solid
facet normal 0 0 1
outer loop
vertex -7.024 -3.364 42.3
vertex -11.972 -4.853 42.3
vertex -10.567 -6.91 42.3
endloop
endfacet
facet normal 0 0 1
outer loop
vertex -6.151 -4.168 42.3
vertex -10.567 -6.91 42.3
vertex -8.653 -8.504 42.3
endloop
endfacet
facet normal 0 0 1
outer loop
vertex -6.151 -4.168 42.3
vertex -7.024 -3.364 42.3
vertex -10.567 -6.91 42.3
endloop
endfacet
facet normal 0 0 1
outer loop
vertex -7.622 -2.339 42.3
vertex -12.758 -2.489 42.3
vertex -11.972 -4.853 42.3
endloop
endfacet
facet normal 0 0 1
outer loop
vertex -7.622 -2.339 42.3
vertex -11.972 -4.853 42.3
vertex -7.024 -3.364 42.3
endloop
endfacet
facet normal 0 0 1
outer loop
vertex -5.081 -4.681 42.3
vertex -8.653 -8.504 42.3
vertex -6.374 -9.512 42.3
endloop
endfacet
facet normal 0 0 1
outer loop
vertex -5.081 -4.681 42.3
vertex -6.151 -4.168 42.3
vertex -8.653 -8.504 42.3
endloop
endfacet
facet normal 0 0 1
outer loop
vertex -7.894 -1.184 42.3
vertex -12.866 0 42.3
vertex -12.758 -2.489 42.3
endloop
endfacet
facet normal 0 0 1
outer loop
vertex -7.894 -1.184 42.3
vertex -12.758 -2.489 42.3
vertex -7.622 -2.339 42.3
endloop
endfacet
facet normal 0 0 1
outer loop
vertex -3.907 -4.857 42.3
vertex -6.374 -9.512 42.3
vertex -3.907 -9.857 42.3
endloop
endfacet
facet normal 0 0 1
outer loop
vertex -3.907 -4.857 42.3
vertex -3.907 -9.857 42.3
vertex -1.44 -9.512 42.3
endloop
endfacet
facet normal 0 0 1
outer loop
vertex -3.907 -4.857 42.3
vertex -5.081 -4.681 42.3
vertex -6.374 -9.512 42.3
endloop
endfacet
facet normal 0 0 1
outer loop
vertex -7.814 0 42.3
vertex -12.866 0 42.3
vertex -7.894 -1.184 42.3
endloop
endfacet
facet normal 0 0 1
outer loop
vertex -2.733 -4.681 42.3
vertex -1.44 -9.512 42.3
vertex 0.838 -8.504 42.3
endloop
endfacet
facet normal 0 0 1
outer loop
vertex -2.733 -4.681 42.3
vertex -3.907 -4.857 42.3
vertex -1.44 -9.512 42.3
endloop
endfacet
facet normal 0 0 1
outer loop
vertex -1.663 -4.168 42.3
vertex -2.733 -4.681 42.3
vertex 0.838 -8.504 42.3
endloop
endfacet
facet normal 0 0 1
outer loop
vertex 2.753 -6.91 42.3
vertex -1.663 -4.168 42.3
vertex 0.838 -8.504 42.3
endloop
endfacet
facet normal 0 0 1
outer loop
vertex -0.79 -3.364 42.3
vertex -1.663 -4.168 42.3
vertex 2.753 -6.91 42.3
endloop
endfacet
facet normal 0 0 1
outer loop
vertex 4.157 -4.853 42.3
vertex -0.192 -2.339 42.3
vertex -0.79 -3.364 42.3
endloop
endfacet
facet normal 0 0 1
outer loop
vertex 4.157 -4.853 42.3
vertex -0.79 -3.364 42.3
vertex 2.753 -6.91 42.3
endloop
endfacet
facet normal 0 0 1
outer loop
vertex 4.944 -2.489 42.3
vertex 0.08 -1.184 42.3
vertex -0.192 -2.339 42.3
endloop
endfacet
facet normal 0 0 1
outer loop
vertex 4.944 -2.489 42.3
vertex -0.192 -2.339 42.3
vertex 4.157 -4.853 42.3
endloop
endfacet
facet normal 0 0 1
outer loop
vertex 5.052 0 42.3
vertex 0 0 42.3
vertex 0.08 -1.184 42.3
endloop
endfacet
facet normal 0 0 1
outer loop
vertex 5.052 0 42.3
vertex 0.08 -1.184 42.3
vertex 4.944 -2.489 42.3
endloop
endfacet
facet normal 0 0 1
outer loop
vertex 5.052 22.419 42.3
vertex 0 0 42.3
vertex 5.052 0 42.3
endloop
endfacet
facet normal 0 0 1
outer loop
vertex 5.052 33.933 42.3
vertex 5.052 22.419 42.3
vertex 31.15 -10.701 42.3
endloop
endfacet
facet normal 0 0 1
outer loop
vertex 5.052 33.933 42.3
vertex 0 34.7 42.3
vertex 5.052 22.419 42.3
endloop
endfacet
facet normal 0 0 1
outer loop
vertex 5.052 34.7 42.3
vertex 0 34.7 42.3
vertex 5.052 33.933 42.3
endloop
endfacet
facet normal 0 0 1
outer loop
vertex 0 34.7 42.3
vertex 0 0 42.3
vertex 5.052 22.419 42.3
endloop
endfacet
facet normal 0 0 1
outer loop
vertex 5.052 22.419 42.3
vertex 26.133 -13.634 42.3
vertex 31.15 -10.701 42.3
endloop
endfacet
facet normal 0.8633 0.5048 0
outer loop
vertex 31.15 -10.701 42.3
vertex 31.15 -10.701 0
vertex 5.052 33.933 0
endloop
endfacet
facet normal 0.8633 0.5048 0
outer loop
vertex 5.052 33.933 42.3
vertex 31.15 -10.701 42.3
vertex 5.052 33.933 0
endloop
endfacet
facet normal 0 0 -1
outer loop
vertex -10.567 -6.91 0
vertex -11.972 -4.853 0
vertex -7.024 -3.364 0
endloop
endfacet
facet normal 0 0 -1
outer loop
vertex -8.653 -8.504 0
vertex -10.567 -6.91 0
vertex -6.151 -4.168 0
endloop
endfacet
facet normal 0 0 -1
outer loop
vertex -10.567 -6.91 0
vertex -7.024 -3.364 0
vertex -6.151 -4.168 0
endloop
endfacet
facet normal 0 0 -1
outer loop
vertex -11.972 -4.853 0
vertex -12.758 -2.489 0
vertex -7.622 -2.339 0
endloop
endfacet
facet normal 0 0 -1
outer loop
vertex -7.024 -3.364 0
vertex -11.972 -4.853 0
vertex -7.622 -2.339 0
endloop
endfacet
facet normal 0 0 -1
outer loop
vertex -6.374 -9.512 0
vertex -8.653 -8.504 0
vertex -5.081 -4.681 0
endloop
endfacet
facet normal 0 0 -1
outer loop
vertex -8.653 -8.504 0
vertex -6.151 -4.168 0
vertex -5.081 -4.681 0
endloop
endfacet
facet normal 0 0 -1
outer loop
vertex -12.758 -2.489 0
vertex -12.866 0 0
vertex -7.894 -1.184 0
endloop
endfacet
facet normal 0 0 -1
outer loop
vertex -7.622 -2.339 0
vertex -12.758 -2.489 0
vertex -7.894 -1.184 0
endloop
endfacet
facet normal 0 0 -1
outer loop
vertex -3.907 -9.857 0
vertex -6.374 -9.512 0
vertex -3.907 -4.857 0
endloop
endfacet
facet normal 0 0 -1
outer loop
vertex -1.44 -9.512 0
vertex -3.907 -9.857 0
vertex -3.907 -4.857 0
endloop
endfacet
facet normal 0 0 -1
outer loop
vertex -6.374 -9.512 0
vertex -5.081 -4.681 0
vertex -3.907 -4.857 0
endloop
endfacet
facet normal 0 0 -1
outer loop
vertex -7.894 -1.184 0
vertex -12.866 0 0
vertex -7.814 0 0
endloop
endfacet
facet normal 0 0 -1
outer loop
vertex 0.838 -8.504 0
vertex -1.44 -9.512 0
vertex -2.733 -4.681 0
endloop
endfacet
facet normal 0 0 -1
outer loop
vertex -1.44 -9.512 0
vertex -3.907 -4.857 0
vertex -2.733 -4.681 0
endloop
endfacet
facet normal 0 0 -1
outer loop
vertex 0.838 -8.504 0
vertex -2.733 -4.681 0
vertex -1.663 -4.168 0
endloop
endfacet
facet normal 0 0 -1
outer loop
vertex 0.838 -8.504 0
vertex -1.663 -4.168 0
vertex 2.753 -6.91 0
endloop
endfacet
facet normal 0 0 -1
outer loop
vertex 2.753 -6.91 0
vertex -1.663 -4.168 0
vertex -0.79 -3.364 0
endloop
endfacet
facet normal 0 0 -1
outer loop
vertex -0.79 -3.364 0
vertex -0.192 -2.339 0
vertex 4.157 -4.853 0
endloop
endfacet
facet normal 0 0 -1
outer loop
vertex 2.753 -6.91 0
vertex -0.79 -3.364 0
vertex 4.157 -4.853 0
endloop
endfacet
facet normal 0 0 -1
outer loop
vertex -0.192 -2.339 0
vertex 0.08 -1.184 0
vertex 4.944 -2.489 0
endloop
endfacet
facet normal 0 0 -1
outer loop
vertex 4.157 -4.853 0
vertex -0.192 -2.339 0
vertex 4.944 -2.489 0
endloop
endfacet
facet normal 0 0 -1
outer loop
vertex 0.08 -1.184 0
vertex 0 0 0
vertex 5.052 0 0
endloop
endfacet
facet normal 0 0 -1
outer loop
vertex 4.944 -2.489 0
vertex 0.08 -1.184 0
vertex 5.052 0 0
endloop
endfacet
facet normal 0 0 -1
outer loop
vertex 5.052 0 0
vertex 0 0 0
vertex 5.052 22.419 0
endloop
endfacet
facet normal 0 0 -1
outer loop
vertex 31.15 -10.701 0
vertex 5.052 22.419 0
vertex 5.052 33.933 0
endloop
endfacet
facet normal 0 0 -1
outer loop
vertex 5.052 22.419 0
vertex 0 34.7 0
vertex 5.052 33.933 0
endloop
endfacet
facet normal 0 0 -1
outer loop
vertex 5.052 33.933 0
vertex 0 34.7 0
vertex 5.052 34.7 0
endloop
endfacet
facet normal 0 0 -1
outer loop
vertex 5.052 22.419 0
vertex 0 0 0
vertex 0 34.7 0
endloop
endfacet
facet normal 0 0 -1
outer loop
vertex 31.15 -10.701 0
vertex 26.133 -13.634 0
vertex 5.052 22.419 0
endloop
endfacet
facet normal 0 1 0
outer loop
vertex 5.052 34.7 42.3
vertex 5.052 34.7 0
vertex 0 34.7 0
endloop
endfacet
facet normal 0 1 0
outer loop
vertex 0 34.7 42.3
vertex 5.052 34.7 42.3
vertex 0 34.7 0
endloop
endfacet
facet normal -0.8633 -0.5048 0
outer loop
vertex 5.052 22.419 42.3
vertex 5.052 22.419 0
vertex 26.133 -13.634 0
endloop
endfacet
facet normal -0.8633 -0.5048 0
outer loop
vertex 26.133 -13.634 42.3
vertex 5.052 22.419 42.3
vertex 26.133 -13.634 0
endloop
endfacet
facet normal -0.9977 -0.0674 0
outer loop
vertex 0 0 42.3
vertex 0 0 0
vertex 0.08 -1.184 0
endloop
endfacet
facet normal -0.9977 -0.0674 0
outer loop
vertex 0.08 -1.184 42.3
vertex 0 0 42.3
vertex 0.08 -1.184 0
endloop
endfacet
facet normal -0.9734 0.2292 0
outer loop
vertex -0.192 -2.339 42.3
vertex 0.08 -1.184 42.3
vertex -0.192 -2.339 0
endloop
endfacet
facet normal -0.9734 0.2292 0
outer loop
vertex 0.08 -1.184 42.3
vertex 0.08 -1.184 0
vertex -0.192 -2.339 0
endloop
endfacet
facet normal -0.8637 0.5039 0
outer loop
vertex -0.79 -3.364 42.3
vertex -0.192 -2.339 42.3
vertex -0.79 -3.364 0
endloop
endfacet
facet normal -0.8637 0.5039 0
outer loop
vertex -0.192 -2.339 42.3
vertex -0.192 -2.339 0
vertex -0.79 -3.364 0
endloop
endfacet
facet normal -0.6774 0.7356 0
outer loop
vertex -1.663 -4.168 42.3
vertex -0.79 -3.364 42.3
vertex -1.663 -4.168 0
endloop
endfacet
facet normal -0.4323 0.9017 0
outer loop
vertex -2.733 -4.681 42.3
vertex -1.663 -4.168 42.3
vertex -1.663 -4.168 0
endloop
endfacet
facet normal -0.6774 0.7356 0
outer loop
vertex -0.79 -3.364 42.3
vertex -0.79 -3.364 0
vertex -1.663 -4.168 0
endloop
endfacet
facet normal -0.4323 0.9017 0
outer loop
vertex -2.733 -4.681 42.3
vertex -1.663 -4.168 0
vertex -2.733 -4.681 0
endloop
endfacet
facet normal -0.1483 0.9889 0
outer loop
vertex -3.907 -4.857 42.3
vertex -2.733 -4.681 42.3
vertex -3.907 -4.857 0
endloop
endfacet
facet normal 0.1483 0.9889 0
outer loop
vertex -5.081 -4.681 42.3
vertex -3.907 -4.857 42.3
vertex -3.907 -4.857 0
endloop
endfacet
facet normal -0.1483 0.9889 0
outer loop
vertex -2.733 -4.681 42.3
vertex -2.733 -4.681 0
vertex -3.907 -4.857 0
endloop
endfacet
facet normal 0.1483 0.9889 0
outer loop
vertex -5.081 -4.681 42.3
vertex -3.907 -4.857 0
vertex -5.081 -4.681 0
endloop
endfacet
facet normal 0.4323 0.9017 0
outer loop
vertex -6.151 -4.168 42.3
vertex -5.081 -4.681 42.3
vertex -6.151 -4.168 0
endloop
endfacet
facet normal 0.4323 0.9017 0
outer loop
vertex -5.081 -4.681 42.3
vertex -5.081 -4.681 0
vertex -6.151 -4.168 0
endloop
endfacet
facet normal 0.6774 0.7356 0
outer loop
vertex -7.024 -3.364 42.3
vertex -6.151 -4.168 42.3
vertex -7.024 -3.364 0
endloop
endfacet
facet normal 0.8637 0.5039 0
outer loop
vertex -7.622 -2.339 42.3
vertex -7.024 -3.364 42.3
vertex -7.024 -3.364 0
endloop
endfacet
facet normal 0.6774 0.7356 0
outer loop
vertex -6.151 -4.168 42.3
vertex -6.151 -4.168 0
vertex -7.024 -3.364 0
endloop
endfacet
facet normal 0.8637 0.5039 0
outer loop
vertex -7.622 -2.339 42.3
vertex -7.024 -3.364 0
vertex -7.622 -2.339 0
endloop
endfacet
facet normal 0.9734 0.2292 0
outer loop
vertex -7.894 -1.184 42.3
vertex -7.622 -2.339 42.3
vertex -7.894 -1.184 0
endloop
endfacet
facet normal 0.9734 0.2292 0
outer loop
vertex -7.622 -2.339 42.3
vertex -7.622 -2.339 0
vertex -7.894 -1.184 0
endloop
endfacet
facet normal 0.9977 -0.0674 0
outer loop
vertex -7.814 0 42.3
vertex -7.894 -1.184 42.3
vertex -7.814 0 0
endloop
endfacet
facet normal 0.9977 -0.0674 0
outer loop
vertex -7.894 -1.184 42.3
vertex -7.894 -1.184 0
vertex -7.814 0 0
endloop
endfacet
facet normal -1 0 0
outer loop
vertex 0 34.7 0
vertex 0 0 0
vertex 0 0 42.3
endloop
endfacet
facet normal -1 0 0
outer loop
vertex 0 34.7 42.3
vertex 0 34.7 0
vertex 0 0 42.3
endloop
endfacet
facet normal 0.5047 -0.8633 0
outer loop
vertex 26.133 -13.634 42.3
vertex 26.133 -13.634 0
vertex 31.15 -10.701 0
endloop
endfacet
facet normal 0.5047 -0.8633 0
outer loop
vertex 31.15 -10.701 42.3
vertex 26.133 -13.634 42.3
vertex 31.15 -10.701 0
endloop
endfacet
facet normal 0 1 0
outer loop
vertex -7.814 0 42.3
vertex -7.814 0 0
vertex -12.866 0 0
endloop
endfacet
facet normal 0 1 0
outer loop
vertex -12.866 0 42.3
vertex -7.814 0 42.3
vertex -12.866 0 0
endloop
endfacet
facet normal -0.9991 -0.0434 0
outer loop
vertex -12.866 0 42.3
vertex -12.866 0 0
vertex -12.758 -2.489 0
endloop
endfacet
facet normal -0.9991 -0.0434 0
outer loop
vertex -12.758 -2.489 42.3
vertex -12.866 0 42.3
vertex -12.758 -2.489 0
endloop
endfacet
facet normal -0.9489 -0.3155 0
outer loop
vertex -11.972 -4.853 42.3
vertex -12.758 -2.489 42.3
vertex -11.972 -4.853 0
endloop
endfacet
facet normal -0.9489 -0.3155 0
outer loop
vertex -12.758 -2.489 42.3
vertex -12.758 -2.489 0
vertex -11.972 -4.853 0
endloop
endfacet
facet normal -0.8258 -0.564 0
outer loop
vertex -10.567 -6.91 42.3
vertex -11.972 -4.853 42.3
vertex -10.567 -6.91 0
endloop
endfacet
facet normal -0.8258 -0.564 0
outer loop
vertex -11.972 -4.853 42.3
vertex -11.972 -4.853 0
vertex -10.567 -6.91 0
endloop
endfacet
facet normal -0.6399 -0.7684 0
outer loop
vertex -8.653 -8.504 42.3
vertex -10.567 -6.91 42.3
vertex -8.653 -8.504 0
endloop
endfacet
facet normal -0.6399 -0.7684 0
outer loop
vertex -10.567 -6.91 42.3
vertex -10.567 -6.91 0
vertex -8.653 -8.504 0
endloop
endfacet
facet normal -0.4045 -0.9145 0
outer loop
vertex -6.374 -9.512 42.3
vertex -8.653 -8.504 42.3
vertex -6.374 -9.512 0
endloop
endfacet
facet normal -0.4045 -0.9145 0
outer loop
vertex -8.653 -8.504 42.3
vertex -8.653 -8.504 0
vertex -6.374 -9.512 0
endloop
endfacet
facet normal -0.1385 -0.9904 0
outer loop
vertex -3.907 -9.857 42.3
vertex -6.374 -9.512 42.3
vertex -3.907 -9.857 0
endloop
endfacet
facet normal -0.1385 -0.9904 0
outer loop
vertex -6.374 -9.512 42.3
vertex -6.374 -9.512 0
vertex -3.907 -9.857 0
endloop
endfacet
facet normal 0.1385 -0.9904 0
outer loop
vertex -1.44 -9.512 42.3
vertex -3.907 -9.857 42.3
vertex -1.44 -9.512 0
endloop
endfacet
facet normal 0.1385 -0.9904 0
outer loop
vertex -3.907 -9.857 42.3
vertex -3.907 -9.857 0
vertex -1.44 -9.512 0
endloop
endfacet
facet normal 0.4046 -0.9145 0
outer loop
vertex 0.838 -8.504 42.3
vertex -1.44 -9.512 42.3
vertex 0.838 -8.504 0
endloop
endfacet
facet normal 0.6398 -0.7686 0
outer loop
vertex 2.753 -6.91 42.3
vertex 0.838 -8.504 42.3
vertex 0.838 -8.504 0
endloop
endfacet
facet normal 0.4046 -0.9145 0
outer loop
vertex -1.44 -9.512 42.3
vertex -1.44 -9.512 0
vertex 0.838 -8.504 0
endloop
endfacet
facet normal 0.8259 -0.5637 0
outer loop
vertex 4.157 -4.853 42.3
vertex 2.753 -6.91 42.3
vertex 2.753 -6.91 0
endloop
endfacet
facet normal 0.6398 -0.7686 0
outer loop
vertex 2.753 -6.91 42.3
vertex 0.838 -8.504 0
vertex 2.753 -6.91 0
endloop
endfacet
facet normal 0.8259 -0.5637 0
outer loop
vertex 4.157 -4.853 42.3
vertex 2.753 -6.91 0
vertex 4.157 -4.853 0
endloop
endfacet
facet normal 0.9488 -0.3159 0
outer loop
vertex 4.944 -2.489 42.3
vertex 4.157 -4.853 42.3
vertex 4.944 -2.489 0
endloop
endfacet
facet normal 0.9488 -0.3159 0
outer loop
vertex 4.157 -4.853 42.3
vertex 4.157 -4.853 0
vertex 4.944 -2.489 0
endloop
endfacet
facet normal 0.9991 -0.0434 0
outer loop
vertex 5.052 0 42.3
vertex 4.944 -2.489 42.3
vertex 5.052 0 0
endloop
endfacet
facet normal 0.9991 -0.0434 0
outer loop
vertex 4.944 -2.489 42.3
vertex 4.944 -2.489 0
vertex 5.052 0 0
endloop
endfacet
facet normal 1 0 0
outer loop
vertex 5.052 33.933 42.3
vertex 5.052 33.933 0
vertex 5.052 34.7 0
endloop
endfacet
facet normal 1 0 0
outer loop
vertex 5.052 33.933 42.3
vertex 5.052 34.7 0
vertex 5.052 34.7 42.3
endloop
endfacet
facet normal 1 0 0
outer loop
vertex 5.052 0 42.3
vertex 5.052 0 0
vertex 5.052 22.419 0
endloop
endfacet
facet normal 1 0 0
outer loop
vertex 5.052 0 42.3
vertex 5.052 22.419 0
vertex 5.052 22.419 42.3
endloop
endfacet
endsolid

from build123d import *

# Parameters (mm, degrees)
F3_DEPTH = 42.3
F4_W     = 5.0520027294
F4_H     = 42.3
F5_DEPTH = 34.7
F7_DEPTH = 42.3


# Not quite as in the source:
# - the program builds the solid bodies; features that only make, move or delete a surface that nothing else refers to are left out


with BuildPart() as f3:
    # F0 (on Top) → F3 (new body)
    with BuildSketch(Plane.XY):
        with BuildLine():
            ThreePointArc((0, 0), (-3.9070909635, -4.8571115465), (-7.8141819269, 0))
            Line((-7.8141819269, 0), (-12.8661846563, 0))
            ThreePointArc((-12.8661846563, 0), (-3.9070909635, -9.8571115465), (5.0520027294, 0))
            Line((5.0520027294, 0), (0, 0))
        make_face()
    extrude(amount=F3_DEPTH)

    # F4 (on face) → F5 (join)
    with BuildSketch(Plane(origin=(0, 0, 0), x_dir=(-1, 0, 0), z_dir=(0, 1, 0))):
        with Locations((-2.5260013647, 21.15)):
            Rectangle(F4_W, F4_H)
    extrude(amount=F5_DEPTH)

    # F6 (on Top) → F7 (join)
    with BuildSketch(Plane.XY):
        Polygon((31.1498828232, -10.7009746134), (4.7412305139, 34.4645157456), (4.6712128018, 23.0707097992), (26.133000959, -13.6343887705), align=None)
    extrude(amount=F7_DEPTH)


solid = f3.part
